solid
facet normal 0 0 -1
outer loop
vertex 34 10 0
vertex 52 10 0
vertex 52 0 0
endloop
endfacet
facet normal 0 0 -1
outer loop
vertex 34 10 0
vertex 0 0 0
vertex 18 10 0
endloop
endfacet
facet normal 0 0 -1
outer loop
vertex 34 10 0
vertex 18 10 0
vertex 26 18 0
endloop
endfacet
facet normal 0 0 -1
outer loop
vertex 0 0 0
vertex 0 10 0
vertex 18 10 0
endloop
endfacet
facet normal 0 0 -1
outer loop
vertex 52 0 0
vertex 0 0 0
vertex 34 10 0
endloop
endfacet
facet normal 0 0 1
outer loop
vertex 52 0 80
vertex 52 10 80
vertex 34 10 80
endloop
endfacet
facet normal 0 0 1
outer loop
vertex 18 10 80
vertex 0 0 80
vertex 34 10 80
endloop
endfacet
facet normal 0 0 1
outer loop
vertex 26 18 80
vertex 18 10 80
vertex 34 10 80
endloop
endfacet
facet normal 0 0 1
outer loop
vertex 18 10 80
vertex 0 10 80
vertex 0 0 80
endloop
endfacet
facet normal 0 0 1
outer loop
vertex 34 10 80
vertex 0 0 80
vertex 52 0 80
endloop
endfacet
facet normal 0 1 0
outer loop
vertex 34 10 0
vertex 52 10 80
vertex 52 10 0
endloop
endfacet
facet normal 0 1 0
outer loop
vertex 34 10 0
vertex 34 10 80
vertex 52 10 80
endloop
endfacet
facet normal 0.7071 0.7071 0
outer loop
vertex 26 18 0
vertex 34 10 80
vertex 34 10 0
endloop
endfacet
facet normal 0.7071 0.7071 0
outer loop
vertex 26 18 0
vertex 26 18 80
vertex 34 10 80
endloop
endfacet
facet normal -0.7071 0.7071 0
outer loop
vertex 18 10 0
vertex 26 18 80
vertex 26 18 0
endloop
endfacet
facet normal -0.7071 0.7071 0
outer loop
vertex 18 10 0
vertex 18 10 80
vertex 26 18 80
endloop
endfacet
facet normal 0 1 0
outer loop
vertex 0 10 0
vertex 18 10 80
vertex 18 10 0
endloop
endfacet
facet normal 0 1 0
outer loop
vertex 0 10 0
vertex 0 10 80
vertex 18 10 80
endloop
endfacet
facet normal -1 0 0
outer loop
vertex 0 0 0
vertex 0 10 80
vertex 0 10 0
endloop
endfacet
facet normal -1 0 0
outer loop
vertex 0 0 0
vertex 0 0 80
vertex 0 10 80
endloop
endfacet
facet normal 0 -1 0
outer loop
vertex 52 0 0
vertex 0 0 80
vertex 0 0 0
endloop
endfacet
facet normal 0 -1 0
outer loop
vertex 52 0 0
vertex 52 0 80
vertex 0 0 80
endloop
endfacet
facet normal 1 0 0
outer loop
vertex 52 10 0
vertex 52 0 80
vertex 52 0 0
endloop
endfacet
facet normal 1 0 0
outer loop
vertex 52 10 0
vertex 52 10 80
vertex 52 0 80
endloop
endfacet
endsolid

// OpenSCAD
$fn = 32;

// ----------------------------------------------------------------------
// V guide rail: vrib, 52 mm wide
// ----------------------------------------------------------------------

// --- parameters (mm) ---
rail_w = 52;              // rail width, X
base_t = 10;              // base plate thickness
v_depth = 8;              // V feature depth / height
v_half_w = 8;             // half width of the V at the base face
plate_t = 80;             // rail length, Z (the extrusion height)

profile = [[0, 0], [52, 0], [52, 10], [34, 10], [26, 18], [18, 10], [0, 10]];  // primary outline, 7 points, counter clockwise

// --- the one profile operation ---
linear_extrude(height = plate_t) polygon(points = profile);
